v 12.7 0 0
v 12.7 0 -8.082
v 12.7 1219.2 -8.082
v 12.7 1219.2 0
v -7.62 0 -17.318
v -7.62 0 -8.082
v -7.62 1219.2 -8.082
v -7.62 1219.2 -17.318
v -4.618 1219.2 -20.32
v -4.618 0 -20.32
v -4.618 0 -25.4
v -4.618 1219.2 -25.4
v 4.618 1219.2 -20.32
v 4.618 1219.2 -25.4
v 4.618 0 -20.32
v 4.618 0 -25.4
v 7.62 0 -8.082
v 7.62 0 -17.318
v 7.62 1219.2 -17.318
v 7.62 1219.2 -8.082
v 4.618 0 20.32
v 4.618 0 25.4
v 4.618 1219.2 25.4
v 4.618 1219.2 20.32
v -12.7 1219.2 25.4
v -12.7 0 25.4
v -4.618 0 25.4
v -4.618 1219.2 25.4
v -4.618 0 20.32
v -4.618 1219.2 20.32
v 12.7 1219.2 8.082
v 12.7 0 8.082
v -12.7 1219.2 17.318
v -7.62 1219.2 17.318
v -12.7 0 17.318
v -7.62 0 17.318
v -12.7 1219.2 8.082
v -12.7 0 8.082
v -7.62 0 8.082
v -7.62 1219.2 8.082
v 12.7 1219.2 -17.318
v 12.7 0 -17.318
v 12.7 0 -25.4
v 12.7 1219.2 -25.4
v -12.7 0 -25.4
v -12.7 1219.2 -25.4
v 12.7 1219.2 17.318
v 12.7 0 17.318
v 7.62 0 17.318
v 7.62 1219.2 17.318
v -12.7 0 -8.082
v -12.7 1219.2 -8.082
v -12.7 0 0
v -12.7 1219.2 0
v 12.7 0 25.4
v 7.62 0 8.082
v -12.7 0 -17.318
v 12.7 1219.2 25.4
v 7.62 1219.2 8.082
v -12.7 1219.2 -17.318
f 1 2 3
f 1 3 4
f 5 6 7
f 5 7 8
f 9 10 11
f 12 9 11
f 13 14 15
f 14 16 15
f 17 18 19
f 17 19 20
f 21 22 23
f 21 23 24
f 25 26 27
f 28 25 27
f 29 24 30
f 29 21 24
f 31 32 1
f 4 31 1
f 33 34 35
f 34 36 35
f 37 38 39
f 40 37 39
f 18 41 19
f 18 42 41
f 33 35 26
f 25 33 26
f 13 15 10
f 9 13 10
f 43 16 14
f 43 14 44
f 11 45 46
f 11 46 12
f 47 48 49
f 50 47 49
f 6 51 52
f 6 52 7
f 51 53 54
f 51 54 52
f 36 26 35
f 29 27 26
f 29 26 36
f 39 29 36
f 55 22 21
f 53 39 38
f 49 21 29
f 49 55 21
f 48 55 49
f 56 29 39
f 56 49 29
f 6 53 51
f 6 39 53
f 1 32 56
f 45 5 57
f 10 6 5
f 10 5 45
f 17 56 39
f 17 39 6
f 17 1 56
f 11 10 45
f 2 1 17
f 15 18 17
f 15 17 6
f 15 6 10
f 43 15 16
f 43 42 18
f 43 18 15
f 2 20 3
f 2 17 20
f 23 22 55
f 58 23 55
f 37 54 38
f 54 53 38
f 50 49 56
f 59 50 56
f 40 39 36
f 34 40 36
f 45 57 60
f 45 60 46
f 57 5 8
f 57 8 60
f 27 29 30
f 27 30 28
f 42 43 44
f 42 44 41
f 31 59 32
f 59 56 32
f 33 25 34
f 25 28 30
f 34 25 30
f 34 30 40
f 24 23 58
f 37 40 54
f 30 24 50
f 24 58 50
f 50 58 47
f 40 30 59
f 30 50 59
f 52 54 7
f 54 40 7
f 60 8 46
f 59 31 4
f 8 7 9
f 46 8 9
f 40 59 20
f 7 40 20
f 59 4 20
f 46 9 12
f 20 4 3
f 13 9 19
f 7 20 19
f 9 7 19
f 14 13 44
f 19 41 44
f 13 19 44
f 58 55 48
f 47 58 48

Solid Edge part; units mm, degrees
sketch "Sketch1" plane through (0, 0, 0) normal (0, -1, 0) x (1, 0, 0)
  line L0 (12.7, -25.4) -> (12.7, -17.3179)
  line L1 (12.7, -17.3179) -> (7.62, -17.3179)
  line L2 (7.62, -17.3179) -> (7.62, -8.0821)
  line L3 (7.62, -8.0821) -> (12.7, -8.0821)
  line L4 (12.7, -8.0821) -> (12.7, 0)
  line L5 (12.7, 8.0821) -> (12.7, 0)
  line L6 (7.62, 8.0821) -> (12.7, 8.0821)
  line L7 (7.62, 17.3179) -> (7.62, 8.0821)
  line L8 (12.7, 17.3179) -> (7.62, 17.3179)
  line L9 (12.7, 25.4) -> (12.7, 17.3179)
  line L10 (4.6179, 25.4) -> (12.7, 25.4)
  line L11 (4.6179, 25.4) -> (4.6179, 20.32)
  line L12 (4.6179, 20.32) -> (-4.6179, 20.32)
  line L13 (-4.6179, 20.32) -> (-4.6179, 25.4)
  line L14 (-12.7, 25.4) -> (-4.6179, 25.4)
  line L15 (-12.7, 17.3179) -> (-12.7, 25.4)
  line L16 (-7.62, 17.3179) -> (-12.7, 17.3179)
  line L17 (-7.62, 8.0821) -> (-7.62, 17.3179)
  line L18 (-12.7, 8.0821) -> (-7.62, 8.0821)
  line L19 (-12.7, 0) -> (-12.7, 8.0821)
  line L20 (-12.7, 0) -> (-12.7, -8.0821)
  line L21 (-12.7, -8.0821) -> (-7.62, -8.0821)
  line L22 (-7.62, -8.0821) -> (-7.62, -17.3179)
  line L23 (-7.62, -17.3179) -> (-12.7, -17.3179)
  line L24 (-12.7, -17.3179) -> (-12.7, -25.4)
  line L25 (-12.7, -25.4) -> (-4.6179, -25.4)
  line L26 (-4.6179, -20.32) -> (-4.6179, -25.4)
  line L27 (4.6179, -20.32) -> (-4.6179, -20.32)
  line L28 (4.6179, -25.4) -> (4.6179, -20.32)
  line L29 (4.6179, -25.4) -> (12.7, -25.4)
extrude "Protrusion1" add sketch "Sketch1" against normal blind 1219.2
